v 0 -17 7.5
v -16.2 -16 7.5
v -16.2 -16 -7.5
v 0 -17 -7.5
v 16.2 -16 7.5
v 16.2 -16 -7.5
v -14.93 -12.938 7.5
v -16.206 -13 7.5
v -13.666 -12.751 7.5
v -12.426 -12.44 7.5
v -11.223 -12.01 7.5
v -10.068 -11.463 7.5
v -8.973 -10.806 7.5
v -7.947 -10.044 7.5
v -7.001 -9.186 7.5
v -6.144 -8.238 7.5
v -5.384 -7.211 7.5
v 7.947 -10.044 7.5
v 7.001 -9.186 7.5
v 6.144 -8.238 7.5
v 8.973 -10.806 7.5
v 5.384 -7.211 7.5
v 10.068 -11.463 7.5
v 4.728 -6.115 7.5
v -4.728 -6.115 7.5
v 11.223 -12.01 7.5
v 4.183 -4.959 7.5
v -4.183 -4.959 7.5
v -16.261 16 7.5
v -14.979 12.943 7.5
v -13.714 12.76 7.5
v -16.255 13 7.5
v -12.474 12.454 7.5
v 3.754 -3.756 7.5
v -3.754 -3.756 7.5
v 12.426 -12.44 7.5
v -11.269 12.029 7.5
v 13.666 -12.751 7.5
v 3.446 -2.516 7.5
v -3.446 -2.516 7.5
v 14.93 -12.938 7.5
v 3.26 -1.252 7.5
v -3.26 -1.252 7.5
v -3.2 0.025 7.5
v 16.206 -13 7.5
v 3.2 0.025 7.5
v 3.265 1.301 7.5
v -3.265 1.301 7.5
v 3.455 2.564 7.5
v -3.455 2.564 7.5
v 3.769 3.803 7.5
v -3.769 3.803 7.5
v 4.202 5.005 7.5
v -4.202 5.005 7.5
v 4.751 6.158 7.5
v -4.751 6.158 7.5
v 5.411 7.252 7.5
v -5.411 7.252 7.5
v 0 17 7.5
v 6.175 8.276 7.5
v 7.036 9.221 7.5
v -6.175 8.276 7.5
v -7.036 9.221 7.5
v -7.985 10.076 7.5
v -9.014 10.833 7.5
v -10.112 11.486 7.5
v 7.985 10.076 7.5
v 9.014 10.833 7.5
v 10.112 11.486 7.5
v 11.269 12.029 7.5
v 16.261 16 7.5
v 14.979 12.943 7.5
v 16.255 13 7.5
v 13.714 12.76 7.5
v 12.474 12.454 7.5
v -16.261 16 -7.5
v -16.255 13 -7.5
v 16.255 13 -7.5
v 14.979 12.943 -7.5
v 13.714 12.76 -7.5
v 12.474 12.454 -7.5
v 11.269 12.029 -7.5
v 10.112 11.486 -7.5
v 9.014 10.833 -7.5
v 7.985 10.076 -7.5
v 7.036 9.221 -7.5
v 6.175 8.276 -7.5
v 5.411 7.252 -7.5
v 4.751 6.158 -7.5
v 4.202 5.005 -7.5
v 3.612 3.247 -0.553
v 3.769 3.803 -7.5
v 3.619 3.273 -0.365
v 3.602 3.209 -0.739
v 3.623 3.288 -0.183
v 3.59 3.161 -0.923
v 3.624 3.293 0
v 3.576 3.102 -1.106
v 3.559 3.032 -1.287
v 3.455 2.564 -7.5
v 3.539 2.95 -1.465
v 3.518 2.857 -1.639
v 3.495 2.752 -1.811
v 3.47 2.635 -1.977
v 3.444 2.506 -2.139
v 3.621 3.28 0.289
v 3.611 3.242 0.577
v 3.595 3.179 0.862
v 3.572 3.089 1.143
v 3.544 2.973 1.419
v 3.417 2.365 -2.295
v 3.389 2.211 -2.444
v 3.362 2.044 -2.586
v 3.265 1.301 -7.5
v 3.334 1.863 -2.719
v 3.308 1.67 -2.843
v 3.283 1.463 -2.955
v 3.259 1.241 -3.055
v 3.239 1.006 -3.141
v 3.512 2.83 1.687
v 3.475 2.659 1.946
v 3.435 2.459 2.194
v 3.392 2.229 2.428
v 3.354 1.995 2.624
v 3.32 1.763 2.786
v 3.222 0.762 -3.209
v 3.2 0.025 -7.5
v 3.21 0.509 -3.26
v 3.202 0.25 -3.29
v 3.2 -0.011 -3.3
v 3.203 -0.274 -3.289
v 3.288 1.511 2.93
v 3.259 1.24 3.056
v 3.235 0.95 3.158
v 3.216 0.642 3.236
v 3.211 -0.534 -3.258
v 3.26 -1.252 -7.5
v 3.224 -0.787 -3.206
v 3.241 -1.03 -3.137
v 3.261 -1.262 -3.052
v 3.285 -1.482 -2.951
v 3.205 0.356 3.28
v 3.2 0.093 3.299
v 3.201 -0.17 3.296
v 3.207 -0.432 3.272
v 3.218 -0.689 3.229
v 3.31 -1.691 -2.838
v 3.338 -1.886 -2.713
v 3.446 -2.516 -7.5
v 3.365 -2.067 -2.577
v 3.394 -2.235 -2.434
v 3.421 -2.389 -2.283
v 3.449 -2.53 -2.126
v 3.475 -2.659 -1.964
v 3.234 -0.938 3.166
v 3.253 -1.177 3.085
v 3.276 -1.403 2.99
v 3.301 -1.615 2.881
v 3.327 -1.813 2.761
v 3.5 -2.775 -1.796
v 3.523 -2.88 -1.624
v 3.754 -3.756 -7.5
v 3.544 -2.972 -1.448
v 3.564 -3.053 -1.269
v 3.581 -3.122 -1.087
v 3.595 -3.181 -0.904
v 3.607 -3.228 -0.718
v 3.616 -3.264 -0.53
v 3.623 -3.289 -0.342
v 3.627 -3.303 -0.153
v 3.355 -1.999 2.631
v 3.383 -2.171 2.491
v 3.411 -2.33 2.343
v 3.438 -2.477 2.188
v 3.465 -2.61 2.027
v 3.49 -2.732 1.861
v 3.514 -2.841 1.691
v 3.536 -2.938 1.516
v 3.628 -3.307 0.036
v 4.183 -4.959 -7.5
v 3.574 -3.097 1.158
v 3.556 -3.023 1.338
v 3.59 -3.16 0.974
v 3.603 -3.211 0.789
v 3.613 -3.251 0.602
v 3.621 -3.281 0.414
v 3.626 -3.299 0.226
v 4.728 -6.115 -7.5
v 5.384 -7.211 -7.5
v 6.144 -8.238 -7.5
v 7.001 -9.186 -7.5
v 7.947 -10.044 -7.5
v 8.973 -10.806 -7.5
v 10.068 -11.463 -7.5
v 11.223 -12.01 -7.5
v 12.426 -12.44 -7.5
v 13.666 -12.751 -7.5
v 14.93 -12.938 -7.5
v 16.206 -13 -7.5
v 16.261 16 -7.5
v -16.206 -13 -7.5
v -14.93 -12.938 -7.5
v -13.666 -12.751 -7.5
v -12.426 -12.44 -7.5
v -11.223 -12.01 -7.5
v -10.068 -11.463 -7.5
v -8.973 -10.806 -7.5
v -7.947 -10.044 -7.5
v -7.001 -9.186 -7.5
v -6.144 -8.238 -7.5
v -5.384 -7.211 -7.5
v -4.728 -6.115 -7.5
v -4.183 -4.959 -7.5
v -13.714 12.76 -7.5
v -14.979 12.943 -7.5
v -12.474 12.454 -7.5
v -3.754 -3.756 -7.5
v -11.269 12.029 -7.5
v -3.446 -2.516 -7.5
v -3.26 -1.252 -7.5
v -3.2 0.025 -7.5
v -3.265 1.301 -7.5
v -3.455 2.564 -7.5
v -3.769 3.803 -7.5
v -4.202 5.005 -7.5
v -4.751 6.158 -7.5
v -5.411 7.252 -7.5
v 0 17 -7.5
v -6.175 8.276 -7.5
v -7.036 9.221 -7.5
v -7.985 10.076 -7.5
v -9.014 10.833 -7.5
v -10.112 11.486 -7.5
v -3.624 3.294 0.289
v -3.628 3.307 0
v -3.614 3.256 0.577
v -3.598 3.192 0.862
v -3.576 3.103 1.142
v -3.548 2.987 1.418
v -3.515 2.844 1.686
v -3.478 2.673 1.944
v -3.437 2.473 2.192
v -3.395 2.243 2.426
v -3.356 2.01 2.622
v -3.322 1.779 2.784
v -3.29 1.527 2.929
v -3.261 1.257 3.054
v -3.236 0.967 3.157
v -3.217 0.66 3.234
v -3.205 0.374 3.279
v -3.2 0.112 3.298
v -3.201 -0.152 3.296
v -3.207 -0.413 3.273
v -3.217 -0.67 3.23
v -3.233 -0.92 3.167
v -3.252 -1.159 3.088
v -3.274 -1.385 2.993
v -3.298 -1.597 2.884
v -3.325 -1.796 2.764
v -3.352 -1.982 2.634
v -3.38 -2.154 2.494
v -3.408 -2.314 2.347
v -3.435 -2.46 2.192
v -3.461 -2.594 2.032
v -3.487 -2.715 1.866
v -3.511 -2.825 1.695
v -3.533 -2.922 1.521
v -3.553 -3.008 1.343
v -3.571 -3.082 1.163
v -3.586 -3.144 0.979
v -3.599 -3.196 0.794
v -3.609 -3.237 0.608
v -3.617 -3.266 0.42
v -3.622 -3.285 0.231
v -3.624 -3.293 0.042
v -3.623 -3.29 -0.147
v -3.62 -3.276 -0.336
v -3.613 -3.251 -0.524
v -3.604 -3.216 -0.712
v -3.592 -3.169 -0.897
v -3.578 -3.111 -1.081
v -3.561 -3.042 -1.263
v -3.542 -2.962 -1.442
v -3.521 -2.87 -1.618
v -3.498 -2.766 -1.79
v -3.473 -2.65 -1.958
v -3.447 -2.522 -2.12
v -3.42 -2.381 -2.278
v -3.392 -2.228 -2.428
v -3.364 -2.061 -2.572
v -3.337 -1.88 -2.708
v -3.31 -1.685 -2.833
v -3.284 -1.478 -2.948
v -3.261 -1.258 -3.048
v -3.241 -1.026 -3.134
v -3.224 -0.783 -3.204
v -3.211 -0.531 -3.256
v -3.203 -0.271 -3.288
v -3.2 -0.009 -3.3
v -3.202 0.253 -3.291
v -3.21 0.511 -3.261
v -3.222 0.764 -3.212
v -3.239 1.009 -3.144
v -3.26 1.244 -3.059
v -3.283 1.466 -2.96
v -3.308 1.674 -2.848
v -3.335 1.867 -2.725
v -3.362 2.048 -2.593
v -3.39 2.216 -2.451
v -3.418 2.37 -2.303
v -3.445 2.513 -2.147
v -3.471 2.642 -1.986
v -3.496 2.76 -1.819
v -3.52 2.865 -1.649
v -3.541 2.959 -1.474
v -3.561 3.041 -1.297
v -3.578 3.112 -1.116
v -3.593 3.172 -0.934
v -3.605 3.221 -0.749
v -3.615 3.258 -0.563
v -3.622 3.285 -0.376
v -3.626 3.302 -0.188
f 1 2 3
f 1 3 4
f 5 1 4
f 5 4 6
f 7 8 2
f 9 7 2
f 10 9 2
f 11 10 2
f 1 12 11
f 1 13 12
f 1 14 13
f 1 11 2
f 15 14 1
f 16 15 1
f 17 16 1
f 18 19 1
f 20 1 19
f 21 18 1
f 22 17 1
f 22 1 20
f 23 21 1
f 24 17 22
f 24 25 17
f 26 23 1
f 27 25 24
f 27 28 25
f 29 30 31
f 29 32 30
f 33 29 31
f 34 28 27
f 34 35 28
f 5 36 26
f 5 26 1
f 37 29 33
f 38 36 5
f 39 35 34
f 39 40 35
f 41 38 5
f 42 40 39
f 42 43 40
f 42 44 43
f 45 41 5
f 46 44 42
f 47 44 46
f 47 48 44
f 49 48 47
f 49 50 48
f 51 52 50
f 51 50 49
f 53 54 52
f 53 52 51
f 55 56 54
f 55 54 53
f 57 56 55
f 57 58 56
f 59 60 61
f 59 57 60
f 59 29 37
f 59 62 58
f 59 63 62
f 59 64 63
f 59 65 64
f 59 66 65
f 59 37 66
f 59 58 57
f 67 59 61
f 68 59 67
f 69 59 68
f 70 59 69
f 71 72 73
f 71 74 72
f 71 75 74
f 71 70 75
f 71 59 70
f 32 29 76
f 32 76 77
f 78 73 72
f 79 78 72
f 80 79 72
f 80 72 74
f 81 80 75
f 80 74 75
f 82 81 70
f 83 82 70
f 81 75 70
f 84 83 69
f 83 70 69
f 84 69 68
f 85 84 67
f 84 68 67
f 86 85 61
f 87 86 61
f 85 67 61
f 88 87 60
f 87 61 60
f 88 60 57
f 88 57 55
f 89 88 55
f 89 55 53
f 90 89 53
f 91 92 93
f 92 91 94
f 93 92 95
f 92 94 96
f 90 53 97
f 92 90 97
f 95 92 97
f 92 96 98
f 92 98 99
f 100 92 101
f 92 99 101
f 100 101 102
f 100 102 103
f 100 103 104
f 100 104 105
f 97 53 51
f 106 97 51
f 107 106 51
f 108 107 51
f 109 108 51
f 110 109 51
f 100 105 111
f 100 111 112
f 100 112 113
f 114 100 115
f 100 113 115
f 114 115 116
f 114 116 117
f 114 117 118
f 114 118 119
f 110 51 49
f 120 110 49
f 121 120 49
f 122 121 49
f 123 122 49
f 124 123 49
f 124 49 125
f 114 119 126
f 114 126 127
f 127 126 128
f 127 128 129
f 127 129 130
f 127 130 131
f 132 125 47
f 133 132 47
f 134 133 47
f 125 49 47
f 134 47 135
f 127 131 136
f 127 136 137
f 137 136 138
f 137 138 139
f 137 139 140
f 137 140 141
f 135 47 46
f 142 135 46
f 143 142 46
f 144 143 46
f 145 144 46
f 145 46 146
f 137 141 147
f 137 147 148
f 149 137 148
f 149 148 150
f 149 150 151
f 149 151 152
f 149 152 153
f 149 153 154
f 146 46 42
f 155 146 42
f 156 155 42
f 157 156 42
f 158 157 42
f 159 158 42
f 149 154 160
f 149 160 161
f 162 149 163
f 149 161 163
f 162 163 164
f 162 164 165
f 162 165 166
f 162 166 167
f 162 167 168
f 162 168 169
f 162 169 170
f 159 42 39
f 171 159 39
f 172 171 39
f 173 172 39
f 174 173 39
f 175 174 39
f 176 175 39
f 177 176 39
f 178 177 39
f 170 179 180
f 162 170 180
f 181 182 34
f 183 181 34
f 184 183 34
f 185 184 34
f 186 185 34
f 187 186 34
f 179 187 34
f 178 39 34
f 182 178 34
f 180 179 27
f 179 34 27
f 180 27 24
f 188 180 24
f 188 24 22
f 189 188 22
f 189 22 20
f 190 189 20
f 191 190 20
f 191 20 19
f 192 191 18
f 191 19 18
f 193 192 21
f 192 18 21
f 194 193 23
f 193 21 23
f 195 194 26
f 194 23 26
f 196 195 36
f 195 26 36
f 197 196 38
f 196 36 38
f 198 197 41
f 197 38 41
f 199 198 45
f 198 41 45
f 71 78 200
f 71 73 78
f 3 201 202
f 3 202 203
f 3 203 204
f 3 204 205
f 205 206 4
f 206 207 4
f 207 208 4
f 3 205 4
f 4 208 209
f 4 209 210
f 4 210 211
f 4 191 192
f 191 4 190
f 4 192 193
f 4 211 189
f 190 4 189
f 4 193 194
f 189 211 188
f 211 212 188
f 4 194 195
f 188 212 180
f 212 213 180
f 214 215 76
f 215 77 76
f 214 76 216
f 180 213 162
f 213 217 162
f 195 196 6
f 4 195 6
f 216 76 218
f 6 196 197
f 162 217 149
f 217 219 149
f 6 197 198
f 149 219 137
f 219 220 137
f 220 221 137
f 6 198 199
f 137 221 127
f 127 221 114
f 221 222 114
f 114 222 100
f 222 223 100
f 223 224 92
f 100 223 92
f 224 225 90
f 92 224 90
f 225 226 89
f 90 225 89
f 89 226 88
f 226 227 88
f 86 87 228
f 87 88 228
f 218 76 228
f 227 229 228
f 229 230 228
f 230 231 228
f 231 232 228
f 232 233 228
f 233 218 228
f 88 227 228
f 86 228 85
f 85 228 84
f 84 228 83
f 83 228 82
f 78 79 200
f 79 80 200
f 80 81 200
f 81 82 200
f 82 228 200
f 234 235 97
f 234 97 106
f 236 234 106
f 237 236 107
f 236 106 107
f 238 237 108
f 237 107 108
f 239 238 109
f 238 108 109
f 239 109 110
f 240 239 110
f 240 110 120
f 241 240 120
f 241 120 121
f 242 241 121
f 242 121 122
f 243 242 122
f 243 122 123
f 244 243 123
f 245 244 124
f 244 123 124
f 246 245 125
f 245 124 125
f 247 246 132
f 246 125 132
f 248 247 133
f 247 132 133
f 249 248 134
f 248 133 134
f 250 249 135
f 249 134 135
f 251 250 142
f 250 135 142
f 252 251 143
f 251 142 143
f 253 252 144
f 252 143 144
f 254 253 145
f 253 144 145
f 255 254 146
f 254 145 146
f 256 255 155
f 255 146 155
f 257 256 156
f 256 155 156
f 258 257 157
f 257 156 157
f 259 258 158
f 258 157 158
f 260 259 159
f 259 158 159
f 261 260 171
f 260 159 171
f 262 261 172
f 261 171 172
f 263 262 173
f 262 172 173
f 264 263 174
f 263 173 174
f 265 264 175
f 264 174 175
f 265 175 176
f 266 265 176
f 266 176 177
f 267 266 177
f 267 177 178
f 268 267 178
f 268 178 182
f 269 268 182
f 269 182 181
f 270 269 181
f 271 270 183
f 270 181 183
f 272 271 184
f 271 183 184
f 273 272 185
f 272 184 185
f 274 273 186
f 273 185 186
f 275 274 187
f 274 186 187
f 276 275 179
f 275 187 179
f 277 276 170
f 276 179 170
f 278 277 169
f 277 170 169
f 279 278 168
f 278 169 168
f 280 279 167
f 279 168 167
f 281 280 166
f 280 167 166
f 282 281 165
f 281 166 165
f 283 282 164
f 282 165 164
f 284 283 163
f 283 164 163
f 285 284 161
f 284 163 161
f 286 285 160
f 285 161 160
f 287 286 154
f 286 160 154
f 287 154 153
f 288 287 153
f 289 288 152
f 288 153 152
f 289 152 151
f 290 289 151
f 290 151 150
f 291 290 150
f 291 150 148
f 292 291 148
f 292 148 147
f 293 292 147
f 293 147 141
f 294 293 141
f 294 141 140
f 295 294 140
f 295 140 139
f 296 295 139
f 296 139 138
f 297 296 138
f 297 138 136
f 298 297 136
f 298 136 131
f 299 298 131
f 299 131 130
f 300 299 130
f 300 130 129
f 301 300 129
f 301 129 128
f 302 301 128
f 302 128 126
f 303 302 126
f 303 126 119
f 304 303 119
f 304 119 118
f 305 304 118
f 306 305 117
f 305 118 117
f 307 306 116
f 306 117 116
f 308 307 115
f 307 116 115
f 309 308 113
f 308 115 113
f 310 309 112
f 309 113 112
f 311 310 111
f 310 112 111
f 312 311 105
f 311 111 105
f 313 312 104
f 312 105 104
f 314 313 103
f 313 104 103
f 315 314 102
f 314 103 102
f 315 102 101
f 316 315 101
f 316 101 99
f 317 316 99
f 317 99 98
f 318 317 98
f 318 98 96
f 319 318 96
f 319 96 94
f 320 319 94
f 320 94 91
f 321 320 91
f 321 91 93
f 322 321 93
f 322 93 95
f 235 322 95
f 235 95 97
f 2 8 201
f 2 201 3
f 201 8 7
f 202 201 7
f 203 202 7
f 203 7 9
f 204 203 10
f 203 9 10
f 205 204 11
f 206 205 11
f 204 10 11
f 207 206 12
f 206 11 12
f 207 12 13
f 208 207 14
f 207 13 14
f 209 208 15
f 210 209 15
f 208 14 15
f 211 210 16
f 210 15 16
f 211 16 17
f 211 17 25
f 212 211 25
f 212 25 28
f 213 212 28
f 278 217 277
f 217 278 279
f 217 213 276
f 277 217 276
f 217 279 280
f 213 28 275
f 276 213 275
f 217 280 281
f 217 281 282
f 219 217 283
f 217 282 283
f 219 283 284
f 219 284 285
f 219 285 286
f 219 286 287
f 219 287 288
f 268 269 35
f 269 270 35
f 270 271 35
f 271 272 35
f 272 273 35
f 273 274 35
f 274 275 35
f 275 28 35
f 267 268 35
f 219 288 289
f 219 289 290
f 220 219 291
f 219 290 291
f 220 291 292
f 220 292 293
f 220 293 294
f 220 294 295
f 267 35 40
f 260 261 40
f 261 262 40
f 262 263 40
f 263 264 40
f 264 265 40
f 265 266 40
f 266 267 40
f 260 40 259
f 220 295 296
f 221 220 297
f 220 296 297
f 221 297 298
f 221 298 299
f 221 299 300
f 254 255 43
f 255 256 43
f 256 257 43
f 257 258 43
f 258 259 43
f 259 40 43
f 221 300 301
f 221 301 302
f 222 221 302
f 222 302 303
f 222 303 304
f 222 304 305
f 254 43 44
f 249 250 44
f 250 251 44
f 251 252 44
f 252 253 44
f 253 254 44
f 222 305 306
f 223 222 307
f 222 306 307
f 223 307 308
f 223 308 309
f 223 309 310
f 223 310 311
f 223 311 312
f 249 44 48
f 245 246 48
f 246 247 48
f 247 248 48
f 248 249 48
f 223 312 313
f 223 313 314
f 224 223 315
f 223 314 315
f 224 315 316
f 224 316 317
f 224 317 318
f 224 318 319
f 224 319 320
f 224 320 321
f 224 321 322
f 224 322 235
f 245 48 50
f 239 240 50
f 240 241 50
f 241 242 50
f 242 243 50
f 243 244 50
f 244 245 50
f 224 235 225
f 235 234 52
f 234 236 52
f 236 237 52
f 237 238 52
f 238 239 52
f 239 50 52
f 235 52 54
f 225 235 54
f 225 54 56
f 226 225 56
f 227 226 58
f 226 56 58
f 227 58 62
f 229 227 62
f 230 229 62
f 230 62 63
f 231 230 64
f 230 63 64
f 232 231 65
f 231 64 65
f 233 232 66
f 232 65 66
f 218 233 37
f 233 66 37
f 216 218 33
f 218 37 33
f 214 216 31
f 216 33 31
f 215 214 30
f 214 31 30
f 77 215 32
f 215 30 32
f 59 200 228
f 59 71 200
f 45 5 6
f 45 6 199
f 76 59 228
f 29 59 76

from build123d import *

# Parameters (mm, degrees)
F1_DEPTH = 7.5
F2_DEPTH = 12.5
F3_DEPTH = 12.5
F4_R     = 3.3
F4_R_2   = 3.05
F5_DEPTH = 25


with BuildPart() as f1:
    # F0 (on Top) → F1 (new body, symmetric)
    with BuildSketch(Plane.XY):
        with BuildLine():
            ThreePointArc((16.2, -16), (0.200029, 0.030397), (16.260794, 15.999885))
            Line((16.260794, 15.999885), (0, 17))
            Line((0, 17), (0, -17))
            Line((0, -17), (16.2, -16))
        make_face()
        with BuildLine():
            Line((16.255094, 12.999883), (16.260794, 15.999885))
            ThreePointArc((16.260794, 15.999885), (0.200029, 0.030397), (16.2, -16))
            Line((16.2, -16), (16.205699, -12.999999))
            ThreePointArc((16.205699, -12.999999), (3.200023, 0.024697), (16.255094, 12.999883))
        make_face()
        with BuildLine():
            Line((16.205699, -12.999999), (16.255094, 12.999883))
            ThreePointArc((16.255094, 12.999883), (3.200023, 0.024697), (16.205699, -12.999999))
        make_face()
        with BuildLine():
            Line((0, -17), (0, 17))
            Line((0, 17), (-16.260794, 15.999885))
            ThreePointArc((-16.260794, 15.999885), (-0.200029, 0.030397), (-16.2, -16))
            Line((-16.2, -16), (0, -17))
        make_face()
        with BuildLine():
            ThreePointArc((-16.2, -16), (-0.200029, 0.030397), (-16.260794, 15.999885))
            Line((-16.260794, 15.999885), (-16.255094, 12.999883))
            ThreePointArc((-16.255094, 12.999883), (-3.200023, 0.024697), (-16.205699, -12.999999))
            Line((-16.205699, -12.999999), (-16.2, -16))
        make_face()
        with BuildLine():
            ThreePointArc((-16.205699, -12.999999), (-3.200023, 0.024697), (-16.255094, 12.999883))
            Line((-16.255094, 12.999883), (-16.205699, -12.999999))
        make_face()
    extrude(amount=F1_DEPTH, both=True)

    # F0 (on Top) → F2 (cut, symmetric)
    with BuildSketch(Plane.XY):
        with BuildLine():
            ThreePointArc((-16.205699, -12.999999), (-3.200023, 0.024697), (-16.255094, 12.999883))
            Line((-16.255094, 12.999883), (-16.205699, -12.999999))
        make_face()
    extrude(amount=F2_DEPTH, both=True, mode=Mode.SUBTRACT)

    # F0 (on Top) → F3 (cut, symmetric)
    with BuildSketch(Plane.XY):
        with BuildLine():
            Line((16.205699, -12.999999), (16.255094, 12.999883))
            ThreePointArc((16.255094, 12.999883), (3.200023, 0.024697), (16.205699, -12.999999))
        make_face()
    extrude(amount=F3_DEPTH, both=True, mode=Mode.SUBTRACT)

    # F4 (on face) → F5 (cut)
    with BuildSketch(Plane(origin=(16.230338, -0.030835, 0), x_dir=(0.0019, 0.999998, 0), z_dir=(0.999998, -0.0019, 0))):
        Circle(F4_R)
        Circle(F4_R_2, mode=Mode.SUBTRACT)
        Circle(F4_R_2)
    extrude(amount=-F5_DEPTH, mode=Mode.SUBTRACT)


solid = f1.part
